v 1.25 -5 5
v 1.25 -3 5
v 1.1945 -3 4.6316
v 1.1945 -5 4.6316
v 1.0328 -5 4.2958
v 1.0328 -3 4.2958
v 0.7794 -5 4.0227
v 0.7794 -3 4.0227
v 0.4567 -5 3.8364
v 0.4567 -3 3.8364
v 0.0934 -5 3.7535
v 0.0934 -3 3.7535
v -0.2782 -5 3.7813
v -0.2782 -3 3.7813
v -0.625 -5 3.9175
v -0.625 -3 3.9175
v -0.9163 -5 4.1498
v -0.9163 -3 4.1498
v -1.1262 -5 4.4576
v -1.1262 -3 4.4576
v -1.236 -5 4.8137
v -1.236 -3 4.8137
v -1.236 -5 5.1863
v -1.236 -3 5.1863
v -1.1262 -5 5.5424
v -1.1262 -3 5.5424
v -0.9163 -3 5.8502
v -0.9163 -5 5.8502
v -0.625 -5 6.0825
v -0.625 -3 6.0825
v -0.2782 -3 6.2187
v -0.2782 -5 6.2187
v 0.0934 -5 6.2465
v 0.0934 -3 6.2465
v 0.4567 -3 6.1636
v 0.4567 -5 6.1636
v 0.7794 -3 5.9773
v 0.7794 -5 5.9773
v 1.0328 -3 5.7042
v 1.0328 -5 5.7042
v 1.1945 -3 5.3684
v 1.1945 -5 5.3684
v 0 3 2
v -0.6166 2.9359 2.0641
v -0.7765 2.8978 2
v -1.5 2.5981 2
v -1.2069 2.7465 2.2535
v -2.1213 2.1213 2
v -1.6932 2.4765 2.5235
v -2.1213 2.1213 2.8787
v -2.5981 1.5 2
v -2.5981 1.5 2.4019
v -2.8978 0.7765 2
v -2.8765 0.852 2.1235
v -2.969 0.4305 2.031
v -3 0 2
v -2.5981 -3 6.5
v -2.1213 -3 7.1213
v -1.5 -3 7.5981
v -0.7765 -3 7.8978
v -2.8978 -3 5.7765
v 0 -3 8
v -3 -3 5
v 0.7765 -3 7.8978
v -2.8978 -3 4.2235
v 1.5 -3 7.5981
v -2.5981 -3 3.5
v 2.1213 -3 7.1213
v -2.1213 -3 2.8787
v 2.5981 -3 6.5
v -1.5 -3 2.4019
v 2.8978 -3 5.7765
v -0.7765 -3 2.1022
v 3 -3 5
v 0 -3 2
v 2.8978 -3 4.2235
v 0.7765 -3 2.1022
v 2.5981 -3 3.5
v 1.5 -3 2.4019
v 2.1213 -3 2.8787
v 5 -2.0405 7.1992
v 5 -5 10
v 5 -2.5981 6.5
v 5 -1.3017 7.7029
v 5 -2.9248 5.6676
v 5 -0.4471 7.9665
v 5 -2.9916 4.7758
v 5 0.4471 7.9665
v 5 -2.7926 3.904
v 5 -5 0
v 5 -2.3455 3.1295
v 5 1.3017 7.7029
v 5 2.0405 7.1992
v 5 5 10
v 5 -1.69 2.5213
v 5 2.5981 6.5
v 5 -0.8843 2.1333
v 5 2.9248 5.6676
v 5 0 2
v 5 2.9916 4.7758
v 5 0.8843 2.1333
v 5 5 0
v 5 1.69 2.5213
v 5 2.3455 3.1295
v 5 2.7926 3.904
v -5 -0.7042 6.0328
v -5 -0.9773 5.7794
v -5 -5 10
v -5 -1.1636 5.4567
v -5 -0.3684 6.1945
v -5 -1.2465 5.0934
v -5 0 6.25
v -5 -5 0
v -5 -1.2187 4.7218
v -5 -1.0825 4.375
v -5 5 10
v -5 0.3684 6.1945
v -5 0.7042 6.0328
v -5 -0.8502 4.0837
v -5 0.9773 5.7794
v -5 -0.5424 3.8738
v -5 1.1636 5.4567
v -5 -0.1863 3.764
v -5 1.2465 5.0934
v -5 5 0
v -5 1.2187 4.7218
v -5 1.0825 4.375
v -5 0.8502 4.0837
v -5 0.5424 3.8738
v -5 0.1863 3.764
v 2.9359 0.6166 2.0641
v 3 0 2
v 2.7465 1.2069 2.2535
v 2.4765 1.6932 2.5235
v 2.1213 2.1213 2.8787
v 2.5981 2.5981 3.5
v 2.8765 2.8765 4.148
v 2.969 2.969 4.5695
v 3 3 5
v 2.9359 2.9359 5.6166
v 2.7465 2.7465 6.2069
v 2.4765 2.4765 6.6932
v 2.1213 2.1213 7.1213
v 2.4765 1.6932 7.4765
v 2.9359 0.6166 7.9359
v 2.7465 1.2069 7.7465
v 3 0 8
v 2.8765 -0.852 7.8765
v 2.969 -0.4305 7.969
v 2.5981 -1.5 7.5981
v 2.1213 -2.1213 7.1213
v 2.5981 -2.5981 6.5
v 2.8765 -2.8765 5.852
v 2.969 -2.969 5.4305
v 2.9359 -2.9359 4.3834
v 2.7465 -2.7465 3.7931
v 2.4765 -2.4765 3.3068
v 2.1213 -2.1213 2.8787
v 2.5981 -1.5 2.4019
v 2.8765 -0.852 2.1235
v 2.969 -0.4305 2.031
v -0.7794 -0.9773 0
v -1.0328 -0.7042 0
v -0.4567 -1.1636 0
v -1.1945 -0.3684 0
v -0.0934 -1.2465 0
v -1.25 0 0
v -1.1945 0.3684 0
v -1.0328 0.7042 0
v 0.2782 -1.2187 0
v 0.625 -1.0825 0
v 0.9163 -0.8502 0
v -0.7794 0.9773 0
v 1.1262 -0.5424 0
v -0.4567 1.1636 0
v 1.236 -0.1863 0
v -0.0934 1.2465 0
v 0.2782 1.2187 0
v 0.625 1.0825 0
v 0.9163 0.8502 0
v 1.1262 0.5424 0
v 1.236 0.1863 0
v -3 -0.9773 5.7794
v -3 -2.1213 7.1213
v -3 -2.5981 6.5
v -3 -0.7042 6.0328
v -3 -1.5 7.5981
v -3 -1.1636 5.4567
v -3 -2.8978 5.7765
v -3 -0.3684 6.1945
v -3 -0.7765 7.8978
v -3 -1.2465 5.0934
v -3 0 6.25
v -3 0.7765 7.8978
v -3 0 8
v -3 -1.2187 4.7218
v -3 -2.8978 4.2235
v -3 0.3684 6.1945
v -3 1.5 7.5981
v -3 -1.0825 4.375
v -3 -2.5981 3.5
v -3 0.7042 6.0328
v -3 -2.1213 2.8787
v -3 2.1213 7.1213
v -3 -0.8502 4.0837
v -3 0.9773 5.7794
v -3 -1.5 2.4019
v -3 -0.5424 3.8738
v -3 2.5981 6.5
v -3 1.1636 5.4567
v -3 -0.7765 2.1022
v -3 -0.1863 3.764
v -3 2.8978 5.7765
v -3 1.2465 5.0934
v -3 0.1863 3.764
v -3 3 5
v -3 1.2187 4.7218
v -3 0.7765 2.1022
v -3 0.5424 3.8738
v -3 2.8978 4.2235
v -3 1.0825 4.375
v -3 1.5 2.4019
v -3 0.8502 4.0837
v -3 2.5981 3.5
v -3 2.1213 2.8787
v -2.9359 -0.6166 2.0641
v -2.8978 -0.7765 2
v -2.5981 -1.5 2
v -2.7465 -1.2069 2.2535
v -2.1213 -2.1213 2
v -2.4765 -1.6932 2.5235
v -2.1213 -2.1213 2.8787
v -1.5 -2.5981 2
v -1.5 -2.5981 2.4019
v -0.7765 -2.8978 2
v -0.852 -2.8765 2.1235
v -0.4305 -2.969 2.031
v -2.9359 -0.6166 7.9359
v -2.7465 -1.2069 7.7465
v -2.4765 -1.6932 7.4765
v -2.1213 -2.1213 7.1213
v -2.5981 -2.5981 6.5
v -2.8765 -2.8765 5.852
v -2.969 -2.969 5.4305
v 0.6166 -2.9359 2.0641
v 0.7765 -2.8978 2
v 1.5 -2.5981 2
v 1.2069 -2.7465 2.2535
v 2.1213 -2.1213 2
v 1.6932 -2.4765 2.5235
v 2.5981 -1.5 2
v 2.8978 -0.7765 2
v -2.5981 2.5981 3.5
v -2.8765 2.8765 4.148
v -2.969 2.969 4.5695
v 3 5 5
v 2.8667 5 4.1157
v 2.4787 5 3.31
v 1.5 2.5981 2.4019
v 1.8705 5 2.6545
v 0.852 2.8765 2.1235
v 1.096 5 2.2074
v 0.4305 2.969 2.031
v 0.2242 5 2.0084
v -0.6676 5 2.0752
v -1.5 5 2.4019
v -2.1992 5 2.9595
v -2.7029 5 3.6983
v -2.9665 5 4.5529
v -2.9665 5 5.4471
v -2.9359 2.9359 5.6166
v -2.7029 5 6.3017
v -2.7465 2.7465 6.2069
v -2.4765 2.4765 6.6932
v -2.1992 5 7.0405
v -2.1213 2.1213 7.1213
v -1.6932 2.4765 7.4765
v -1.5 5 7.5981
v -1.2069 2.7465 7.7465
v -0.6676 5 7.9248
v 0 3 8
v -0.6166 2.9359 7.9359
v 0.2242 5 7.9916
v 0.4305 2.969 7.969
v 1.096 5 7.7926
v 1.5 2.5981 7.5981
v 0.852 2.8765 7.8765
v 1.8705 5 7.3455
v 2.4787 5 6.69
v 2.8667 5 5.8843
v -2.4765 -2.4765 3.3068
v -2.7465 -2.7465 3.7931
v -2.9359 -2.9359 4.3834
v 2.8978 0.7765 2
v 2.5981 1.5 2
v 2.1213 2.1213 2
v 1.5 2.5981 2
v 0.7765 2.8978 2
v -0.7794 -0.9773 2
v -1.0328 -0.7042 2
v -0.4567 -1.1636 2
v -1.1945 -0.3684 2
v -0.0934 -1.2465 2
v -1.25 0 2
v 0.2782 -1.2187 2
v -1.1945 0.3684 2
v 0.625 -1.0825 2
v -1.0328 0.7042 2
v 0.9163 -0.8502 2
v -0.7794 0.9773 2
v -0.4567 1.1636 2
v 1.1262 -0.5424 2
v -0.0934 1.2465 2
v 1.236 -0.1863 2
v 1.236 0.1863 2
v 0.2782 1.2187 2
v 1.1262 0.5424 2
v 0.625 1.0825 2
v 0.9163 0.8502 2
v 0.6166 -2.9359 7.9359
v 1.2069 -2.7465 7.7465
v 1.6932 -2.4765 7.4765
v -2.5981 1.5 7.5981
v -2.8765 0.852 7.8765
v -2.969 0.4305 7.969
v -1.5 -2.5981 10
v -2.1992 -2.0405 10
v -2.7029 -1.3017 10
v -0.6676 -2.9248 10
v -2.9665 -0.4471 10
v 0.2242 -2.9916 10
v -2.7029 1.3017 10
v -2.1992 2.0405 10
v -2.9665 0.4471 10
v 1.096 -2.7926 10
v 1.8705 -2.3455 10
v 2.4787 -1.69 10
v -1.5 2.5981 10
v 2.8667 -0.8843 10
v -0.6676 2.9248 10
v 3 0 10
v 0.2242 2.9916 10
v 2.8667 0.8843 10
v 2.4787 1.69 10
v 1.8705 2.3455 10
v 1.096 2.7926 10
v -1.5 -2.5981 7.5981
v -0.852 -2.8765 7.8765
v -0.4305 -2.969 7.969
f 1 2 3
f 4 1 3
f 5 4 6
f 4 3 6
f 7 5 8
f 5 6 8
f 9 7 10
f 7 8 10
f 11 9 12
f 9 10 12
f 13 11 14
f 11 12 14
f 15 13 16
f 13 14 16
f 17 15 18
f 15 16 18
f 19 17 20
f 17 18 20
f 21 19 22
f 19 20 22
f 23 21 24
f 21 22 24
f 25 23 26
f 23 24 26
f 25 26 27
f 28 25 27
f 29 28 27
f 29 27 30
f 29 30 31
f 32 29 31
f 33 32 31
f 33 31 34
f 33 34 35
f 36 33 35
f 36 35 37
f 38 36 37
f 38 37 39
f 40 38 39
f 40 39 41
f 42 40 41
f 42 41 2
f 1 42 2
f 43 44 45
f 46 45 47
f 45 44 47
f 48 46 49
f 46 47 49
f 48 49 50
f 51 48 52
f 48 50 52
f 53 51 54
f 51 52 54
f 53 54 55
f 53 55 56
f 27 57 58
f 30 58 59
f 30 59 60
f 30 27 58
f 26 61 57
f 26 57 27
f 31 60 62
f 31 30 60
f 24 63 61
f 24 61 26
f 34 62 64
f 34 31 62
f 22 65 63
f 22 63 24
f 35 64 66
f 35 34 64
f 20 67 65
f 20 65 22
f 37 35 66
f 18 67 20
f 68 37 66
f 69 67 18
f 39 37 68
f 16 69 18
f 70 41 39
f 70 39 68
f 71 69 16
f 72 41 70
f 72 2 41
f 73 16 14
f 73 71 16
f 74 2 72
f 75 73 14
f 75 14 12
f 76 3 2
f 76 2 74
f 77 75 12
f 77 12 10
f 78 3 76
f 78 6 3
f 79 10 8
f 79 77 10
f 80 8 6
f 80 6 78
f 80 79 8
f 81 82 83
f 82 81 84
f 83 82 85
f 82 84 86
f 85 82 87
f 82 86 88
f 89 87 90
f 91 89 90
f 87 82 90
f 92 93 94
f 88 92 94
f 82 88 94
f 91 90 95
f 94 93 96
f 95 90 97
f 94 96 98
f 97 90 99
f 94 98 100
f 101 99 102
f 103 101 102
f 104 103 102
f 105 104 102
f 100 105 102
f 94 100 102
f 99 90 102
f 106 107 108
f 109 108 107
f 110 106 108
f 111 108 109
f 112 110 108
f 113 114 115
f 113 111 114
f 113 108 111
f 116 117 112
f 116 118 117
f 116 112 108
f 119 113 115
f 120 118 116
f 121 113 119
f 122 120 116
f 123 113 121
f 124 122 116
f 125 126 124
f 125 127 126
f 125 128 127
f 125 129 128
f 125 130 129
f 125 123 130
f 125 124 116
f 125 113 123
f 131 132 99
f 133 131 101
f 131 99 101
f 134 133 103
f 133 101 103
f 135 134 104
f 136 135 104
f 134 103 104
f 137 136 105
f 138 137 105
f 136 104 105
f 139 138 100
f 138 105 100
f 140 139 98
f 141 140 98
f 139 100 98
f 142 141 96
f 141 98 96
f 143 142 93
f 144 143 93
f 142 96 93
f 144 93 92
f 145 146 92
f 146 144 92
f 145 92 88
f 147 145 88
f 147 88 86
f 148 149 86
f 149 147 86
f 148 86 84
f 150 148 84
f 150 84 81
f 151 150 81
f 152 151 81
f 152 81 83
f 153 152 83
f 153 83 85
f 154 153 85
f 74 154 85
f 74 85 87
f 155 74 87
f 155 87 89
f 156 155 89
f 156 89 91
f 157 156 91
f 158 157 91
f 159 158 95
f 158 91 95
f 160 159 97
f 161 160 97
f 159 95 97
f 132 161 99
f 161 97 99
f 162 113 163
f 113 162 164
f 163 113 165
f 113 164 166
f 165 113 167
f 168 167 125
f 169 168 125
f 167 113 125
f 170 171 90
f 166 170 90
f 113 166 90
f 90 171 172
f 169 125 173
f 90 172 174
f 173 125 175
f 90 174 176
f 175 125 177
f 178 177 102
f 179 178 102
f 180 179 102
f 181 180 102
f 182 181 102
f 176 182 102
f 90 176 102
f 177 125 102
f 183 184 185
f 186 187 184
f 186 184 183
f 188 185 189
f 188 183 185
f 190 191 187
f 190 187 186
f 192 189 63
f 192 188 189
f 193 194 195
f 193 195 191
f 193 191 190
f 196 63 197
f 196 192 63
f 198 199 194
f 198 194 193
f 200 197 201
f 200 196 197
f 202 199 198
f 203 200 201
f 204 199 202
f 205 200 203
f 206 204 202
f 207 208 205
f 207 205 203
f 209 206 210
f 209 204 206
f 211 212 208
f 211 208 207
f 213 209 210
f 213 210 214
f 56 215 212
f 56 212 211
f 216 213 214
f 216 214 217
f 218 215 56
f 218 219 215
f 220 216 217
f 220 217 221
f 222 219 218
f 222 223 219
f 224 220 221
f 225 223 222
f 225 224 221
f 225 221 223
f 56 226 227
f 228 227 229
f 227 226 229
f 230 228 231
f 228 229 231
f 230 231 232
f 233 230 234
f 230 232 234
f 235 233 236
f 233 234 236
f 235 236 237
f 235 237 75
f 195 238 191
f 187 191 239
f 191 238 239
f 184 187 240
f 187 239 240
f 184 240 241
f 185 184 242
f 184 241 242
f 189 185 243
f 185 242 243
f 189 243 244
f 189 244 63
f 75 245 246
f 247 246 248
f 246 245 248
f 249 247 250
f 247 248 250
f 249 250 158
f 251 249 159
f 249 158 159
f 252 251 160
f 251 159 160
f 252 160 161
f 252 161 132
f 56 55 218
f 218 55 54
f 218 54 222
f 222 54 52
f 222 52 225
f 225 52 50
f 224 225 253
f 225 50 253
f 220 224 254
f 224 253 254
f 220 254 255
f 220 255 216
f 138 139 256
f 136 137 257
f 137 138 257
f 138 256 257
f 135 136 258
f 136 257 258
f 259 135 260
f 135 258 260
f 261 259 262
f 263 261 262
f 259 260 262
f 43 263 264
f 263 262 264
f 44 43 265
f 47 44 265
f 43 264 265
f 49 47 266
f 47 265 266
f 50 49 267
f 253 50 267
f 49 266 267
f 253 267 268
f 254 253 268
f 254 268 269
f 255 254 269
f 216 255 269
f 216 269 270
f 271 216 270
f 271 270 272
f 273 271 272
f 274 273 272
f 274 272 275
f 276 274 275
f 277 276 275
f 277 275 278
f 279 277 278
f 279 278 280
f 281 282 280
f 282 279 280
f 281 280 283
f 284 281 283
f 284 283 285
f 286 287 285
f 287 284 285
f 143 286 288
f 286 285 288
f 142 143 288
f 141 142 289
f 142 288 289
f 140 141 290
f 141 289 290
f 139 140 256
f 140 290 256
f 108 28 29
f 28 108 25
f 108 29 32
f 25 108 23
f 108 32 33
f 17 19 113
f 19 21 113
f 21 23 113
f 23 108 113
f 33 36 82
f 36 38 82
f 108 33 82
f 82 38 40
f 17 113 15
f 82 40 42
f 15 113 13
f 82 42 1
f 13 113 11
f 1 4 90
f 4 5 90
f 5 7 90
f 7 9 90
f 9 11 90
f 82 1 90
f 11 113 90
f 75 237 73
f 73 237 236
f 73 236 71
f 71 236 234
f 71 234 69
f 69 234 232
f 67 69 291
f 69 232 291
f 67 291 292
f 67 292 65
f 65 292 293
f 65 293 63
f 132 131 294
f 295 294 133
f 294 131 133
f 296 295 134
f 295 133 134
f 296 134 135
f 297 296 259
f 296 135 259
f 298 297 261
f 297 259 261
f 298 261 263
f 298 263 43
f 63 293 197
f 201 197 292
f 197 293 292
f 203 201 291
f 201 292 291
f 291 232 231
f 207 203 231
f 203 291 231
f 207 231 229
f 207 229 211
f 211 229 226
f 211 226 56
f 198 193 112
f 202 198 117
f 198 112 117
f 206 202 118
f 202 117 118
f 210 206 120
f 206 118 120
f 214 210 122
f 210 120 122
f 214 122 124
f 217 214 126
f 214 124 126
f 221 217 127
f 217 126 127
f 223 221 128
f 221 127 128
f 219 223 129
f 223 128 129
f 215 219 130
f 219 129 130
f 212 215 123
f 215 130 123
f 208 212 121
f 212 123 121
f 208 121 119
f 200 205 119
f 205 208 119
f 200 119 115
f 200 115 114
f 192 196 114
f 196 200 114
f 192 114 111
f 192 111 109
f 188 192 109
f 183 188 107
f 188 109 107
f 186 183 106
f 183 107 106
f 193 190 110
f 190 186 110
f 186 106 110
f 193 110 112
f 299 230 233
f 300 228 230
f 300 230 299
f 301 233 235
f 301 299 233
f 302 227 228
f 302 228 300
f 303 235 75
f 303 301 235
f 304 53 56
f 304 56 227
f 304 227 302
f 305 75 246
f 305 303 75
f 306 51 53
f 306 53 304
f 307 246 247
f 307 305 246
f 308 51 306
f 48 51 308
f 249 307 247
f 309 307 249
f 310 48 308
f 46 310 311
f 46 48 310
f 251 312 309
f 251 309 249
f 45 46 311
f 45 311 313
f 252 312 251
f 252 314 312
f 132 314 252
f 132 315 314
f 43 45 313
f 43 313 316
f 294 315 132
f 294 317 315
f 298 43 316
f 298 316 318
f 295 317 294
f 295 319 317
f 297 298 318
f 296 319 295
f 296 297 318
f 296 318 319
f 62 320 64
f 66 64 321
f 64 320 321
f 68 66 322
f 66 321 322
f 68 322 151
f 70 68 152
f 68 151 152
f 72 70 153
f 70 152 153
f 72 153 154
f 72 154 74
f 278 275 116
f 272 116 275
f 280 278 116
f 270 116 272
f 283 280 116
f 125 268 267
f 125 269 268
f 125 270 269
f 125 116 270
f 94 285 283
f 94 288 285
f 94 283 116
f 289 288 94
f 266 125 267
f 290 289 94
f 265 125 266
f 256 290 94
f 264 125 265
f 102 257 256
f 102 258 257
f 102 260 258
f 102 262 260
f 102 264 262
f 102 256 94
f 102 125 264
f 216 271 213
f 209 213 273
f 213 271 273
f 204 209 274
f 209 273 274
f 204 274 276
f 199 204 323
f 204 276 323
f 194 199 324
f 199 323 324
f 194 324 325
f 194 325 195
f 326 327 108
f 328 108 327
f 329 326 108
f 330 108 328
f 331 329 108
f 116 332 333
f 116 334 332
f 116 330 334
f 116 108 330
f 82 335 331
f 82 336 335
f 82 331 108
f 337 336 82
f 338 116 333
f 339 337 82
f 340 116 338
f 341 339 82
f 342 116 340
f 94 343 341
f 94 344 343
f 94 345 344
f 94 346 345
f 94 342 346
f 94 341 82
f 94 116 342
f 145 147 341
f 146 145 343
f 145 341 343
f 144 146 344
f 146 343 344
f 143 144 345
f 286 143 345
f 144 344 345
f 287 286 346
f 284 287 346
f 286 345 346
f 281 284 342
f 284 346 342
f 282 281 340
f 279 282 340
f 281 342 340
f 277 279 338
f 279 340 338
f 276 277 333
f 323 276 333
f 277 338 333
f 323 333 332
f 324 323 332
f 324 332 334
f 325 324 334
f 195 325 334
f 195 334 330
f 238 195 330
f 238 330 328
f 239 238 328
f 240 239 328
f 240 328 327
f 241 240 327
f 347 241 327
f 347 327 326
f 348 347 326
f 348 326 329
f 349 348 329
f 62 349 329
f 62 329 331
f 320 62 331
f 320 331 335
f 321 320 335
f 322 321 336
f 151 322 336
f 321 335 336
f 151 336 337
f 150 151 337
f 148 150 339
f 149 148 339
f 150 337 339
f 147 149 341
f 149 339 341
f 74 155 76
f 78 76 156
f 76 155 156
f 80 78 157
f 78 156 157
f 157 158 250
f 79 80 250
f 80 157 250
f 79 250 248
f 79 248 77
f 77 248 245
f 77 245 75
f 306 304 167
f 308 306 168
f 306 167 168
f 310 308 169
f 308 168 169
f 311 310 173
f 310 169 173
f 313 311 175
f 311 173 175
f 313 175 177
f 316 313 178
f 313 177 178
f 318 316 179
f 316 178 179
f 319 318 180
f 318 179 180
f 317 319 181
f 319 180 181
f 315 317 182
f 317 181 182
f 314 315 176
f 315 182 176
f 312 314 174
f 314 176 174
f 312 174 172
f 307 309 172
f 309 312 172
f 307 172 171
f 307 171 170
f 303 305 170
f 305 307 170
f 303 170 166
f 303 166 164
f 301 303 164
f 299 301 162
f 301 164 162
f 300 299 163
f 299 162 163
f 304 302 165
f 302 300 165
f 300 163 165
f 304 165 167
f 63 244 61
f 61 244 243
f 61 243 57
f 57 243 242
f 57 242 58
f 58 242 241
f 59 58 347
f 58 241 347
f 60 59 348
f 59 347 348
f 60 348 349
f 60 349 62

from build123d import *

# Parameters (mm, degrees)
SCHIZZO1_W                   = 10
SCHIZZO1_H                   = 10
ESTRUSIONE_ESTRUSIONE1_DEPTH = 10
FORO_FILETTATO_M3X0_5_1_D    = 2.5
FORO_FILETTATO_M3X0_5_2_D    = 2.5
FORO_FILETTATO_M3X0_5_3_D    = 2.5
SCHIZZO8_R                   = 3
TAGLIO_ESTRUSIONE1_DEPTH     = 8
SCHIZZO9_R                   = 3
TAGLIO_ESTRUSIONE2_DEPTH     = 8
SCHIZZO10_R                  = 3
TAGLIO_ESTRUSIONE3_DEPTH     = 8


with BuildPart() as part:
    # Schizzo1 → Estrusione-Estrusione1 (new body)
    with BuildSketch(Plane.XY):
        Rectangle(SCHIZZO1_W, SCHIZZO1_H)
    extrude(amount=ESTRUSIONE_ESTRUSIONE1_DEPTH)

    # Foro filettato M3x0.5-1 (through all)
    with Locations(Plane.XY.offset(10)):
        with Locations((0, 0)):
            Hole(FORO_FILETTATO_M3X0_5_1_D / 2)

    # Foro filettato M3x0.5-2 (through all)
    with Locations(Plane(origin=(5, 0, 0), x_dir=(0, 0, -1), z_dir=(1, 0, 0))):
        with Locations((-5, 0)):
            Hole(FORO_FILETTATO_M3X0_5_2_D / 2)

    # Foro filettato M3x0.5-3 (through all)
    with Locations(Plane(origin=(0, -5, 0), x_dir=(-1, 0, 0), z_dir=(0, -1, 0))):
        with Locations((0, -5)):
            Hole(FORO_FILETTATO_M3X0_5_3_D / 2)

    # Schizzo8 → Taglio-Estrusione1 (cut)
    with BuildSketch(Plane.XY.offset(10)):
        Circle(SCHIZZO8_R)
    extrude(amount=-TAGLIO_ESTRUSIONE1_DEPTH, mode=Mode.SUBTRACT)

    # Schizzo9 → Taglio-Estrusione2 (cut)
    with BuildSketch(Plane(origin=(5, 0, 0), x_dir=(0, 0, -1), z_dir=(1, 0, 0))):
        with Locations((-5, 0)):
            Circle(SCHIZZO9_R)
    extrude(amount=-TAGLIO_ESTRUSIONE2_DEPTH, mode=Mode.SUBTRACT)

    # Schizzo10 → Taglio-Estrusione3 (cut)
    with BuildSketch(Plane(origin=(0, 5, 0), x_dir=(1, 0, 0), z_dir=(0, 1, 0))):
        with Locations((0, -5)):
            Circle(SCHIZZO10_R)
    extrude(amount=-TAGLIO_ESTRUSIONE3_DEPTH, mode=Mode.SUBTRACT)


solid = part.part
